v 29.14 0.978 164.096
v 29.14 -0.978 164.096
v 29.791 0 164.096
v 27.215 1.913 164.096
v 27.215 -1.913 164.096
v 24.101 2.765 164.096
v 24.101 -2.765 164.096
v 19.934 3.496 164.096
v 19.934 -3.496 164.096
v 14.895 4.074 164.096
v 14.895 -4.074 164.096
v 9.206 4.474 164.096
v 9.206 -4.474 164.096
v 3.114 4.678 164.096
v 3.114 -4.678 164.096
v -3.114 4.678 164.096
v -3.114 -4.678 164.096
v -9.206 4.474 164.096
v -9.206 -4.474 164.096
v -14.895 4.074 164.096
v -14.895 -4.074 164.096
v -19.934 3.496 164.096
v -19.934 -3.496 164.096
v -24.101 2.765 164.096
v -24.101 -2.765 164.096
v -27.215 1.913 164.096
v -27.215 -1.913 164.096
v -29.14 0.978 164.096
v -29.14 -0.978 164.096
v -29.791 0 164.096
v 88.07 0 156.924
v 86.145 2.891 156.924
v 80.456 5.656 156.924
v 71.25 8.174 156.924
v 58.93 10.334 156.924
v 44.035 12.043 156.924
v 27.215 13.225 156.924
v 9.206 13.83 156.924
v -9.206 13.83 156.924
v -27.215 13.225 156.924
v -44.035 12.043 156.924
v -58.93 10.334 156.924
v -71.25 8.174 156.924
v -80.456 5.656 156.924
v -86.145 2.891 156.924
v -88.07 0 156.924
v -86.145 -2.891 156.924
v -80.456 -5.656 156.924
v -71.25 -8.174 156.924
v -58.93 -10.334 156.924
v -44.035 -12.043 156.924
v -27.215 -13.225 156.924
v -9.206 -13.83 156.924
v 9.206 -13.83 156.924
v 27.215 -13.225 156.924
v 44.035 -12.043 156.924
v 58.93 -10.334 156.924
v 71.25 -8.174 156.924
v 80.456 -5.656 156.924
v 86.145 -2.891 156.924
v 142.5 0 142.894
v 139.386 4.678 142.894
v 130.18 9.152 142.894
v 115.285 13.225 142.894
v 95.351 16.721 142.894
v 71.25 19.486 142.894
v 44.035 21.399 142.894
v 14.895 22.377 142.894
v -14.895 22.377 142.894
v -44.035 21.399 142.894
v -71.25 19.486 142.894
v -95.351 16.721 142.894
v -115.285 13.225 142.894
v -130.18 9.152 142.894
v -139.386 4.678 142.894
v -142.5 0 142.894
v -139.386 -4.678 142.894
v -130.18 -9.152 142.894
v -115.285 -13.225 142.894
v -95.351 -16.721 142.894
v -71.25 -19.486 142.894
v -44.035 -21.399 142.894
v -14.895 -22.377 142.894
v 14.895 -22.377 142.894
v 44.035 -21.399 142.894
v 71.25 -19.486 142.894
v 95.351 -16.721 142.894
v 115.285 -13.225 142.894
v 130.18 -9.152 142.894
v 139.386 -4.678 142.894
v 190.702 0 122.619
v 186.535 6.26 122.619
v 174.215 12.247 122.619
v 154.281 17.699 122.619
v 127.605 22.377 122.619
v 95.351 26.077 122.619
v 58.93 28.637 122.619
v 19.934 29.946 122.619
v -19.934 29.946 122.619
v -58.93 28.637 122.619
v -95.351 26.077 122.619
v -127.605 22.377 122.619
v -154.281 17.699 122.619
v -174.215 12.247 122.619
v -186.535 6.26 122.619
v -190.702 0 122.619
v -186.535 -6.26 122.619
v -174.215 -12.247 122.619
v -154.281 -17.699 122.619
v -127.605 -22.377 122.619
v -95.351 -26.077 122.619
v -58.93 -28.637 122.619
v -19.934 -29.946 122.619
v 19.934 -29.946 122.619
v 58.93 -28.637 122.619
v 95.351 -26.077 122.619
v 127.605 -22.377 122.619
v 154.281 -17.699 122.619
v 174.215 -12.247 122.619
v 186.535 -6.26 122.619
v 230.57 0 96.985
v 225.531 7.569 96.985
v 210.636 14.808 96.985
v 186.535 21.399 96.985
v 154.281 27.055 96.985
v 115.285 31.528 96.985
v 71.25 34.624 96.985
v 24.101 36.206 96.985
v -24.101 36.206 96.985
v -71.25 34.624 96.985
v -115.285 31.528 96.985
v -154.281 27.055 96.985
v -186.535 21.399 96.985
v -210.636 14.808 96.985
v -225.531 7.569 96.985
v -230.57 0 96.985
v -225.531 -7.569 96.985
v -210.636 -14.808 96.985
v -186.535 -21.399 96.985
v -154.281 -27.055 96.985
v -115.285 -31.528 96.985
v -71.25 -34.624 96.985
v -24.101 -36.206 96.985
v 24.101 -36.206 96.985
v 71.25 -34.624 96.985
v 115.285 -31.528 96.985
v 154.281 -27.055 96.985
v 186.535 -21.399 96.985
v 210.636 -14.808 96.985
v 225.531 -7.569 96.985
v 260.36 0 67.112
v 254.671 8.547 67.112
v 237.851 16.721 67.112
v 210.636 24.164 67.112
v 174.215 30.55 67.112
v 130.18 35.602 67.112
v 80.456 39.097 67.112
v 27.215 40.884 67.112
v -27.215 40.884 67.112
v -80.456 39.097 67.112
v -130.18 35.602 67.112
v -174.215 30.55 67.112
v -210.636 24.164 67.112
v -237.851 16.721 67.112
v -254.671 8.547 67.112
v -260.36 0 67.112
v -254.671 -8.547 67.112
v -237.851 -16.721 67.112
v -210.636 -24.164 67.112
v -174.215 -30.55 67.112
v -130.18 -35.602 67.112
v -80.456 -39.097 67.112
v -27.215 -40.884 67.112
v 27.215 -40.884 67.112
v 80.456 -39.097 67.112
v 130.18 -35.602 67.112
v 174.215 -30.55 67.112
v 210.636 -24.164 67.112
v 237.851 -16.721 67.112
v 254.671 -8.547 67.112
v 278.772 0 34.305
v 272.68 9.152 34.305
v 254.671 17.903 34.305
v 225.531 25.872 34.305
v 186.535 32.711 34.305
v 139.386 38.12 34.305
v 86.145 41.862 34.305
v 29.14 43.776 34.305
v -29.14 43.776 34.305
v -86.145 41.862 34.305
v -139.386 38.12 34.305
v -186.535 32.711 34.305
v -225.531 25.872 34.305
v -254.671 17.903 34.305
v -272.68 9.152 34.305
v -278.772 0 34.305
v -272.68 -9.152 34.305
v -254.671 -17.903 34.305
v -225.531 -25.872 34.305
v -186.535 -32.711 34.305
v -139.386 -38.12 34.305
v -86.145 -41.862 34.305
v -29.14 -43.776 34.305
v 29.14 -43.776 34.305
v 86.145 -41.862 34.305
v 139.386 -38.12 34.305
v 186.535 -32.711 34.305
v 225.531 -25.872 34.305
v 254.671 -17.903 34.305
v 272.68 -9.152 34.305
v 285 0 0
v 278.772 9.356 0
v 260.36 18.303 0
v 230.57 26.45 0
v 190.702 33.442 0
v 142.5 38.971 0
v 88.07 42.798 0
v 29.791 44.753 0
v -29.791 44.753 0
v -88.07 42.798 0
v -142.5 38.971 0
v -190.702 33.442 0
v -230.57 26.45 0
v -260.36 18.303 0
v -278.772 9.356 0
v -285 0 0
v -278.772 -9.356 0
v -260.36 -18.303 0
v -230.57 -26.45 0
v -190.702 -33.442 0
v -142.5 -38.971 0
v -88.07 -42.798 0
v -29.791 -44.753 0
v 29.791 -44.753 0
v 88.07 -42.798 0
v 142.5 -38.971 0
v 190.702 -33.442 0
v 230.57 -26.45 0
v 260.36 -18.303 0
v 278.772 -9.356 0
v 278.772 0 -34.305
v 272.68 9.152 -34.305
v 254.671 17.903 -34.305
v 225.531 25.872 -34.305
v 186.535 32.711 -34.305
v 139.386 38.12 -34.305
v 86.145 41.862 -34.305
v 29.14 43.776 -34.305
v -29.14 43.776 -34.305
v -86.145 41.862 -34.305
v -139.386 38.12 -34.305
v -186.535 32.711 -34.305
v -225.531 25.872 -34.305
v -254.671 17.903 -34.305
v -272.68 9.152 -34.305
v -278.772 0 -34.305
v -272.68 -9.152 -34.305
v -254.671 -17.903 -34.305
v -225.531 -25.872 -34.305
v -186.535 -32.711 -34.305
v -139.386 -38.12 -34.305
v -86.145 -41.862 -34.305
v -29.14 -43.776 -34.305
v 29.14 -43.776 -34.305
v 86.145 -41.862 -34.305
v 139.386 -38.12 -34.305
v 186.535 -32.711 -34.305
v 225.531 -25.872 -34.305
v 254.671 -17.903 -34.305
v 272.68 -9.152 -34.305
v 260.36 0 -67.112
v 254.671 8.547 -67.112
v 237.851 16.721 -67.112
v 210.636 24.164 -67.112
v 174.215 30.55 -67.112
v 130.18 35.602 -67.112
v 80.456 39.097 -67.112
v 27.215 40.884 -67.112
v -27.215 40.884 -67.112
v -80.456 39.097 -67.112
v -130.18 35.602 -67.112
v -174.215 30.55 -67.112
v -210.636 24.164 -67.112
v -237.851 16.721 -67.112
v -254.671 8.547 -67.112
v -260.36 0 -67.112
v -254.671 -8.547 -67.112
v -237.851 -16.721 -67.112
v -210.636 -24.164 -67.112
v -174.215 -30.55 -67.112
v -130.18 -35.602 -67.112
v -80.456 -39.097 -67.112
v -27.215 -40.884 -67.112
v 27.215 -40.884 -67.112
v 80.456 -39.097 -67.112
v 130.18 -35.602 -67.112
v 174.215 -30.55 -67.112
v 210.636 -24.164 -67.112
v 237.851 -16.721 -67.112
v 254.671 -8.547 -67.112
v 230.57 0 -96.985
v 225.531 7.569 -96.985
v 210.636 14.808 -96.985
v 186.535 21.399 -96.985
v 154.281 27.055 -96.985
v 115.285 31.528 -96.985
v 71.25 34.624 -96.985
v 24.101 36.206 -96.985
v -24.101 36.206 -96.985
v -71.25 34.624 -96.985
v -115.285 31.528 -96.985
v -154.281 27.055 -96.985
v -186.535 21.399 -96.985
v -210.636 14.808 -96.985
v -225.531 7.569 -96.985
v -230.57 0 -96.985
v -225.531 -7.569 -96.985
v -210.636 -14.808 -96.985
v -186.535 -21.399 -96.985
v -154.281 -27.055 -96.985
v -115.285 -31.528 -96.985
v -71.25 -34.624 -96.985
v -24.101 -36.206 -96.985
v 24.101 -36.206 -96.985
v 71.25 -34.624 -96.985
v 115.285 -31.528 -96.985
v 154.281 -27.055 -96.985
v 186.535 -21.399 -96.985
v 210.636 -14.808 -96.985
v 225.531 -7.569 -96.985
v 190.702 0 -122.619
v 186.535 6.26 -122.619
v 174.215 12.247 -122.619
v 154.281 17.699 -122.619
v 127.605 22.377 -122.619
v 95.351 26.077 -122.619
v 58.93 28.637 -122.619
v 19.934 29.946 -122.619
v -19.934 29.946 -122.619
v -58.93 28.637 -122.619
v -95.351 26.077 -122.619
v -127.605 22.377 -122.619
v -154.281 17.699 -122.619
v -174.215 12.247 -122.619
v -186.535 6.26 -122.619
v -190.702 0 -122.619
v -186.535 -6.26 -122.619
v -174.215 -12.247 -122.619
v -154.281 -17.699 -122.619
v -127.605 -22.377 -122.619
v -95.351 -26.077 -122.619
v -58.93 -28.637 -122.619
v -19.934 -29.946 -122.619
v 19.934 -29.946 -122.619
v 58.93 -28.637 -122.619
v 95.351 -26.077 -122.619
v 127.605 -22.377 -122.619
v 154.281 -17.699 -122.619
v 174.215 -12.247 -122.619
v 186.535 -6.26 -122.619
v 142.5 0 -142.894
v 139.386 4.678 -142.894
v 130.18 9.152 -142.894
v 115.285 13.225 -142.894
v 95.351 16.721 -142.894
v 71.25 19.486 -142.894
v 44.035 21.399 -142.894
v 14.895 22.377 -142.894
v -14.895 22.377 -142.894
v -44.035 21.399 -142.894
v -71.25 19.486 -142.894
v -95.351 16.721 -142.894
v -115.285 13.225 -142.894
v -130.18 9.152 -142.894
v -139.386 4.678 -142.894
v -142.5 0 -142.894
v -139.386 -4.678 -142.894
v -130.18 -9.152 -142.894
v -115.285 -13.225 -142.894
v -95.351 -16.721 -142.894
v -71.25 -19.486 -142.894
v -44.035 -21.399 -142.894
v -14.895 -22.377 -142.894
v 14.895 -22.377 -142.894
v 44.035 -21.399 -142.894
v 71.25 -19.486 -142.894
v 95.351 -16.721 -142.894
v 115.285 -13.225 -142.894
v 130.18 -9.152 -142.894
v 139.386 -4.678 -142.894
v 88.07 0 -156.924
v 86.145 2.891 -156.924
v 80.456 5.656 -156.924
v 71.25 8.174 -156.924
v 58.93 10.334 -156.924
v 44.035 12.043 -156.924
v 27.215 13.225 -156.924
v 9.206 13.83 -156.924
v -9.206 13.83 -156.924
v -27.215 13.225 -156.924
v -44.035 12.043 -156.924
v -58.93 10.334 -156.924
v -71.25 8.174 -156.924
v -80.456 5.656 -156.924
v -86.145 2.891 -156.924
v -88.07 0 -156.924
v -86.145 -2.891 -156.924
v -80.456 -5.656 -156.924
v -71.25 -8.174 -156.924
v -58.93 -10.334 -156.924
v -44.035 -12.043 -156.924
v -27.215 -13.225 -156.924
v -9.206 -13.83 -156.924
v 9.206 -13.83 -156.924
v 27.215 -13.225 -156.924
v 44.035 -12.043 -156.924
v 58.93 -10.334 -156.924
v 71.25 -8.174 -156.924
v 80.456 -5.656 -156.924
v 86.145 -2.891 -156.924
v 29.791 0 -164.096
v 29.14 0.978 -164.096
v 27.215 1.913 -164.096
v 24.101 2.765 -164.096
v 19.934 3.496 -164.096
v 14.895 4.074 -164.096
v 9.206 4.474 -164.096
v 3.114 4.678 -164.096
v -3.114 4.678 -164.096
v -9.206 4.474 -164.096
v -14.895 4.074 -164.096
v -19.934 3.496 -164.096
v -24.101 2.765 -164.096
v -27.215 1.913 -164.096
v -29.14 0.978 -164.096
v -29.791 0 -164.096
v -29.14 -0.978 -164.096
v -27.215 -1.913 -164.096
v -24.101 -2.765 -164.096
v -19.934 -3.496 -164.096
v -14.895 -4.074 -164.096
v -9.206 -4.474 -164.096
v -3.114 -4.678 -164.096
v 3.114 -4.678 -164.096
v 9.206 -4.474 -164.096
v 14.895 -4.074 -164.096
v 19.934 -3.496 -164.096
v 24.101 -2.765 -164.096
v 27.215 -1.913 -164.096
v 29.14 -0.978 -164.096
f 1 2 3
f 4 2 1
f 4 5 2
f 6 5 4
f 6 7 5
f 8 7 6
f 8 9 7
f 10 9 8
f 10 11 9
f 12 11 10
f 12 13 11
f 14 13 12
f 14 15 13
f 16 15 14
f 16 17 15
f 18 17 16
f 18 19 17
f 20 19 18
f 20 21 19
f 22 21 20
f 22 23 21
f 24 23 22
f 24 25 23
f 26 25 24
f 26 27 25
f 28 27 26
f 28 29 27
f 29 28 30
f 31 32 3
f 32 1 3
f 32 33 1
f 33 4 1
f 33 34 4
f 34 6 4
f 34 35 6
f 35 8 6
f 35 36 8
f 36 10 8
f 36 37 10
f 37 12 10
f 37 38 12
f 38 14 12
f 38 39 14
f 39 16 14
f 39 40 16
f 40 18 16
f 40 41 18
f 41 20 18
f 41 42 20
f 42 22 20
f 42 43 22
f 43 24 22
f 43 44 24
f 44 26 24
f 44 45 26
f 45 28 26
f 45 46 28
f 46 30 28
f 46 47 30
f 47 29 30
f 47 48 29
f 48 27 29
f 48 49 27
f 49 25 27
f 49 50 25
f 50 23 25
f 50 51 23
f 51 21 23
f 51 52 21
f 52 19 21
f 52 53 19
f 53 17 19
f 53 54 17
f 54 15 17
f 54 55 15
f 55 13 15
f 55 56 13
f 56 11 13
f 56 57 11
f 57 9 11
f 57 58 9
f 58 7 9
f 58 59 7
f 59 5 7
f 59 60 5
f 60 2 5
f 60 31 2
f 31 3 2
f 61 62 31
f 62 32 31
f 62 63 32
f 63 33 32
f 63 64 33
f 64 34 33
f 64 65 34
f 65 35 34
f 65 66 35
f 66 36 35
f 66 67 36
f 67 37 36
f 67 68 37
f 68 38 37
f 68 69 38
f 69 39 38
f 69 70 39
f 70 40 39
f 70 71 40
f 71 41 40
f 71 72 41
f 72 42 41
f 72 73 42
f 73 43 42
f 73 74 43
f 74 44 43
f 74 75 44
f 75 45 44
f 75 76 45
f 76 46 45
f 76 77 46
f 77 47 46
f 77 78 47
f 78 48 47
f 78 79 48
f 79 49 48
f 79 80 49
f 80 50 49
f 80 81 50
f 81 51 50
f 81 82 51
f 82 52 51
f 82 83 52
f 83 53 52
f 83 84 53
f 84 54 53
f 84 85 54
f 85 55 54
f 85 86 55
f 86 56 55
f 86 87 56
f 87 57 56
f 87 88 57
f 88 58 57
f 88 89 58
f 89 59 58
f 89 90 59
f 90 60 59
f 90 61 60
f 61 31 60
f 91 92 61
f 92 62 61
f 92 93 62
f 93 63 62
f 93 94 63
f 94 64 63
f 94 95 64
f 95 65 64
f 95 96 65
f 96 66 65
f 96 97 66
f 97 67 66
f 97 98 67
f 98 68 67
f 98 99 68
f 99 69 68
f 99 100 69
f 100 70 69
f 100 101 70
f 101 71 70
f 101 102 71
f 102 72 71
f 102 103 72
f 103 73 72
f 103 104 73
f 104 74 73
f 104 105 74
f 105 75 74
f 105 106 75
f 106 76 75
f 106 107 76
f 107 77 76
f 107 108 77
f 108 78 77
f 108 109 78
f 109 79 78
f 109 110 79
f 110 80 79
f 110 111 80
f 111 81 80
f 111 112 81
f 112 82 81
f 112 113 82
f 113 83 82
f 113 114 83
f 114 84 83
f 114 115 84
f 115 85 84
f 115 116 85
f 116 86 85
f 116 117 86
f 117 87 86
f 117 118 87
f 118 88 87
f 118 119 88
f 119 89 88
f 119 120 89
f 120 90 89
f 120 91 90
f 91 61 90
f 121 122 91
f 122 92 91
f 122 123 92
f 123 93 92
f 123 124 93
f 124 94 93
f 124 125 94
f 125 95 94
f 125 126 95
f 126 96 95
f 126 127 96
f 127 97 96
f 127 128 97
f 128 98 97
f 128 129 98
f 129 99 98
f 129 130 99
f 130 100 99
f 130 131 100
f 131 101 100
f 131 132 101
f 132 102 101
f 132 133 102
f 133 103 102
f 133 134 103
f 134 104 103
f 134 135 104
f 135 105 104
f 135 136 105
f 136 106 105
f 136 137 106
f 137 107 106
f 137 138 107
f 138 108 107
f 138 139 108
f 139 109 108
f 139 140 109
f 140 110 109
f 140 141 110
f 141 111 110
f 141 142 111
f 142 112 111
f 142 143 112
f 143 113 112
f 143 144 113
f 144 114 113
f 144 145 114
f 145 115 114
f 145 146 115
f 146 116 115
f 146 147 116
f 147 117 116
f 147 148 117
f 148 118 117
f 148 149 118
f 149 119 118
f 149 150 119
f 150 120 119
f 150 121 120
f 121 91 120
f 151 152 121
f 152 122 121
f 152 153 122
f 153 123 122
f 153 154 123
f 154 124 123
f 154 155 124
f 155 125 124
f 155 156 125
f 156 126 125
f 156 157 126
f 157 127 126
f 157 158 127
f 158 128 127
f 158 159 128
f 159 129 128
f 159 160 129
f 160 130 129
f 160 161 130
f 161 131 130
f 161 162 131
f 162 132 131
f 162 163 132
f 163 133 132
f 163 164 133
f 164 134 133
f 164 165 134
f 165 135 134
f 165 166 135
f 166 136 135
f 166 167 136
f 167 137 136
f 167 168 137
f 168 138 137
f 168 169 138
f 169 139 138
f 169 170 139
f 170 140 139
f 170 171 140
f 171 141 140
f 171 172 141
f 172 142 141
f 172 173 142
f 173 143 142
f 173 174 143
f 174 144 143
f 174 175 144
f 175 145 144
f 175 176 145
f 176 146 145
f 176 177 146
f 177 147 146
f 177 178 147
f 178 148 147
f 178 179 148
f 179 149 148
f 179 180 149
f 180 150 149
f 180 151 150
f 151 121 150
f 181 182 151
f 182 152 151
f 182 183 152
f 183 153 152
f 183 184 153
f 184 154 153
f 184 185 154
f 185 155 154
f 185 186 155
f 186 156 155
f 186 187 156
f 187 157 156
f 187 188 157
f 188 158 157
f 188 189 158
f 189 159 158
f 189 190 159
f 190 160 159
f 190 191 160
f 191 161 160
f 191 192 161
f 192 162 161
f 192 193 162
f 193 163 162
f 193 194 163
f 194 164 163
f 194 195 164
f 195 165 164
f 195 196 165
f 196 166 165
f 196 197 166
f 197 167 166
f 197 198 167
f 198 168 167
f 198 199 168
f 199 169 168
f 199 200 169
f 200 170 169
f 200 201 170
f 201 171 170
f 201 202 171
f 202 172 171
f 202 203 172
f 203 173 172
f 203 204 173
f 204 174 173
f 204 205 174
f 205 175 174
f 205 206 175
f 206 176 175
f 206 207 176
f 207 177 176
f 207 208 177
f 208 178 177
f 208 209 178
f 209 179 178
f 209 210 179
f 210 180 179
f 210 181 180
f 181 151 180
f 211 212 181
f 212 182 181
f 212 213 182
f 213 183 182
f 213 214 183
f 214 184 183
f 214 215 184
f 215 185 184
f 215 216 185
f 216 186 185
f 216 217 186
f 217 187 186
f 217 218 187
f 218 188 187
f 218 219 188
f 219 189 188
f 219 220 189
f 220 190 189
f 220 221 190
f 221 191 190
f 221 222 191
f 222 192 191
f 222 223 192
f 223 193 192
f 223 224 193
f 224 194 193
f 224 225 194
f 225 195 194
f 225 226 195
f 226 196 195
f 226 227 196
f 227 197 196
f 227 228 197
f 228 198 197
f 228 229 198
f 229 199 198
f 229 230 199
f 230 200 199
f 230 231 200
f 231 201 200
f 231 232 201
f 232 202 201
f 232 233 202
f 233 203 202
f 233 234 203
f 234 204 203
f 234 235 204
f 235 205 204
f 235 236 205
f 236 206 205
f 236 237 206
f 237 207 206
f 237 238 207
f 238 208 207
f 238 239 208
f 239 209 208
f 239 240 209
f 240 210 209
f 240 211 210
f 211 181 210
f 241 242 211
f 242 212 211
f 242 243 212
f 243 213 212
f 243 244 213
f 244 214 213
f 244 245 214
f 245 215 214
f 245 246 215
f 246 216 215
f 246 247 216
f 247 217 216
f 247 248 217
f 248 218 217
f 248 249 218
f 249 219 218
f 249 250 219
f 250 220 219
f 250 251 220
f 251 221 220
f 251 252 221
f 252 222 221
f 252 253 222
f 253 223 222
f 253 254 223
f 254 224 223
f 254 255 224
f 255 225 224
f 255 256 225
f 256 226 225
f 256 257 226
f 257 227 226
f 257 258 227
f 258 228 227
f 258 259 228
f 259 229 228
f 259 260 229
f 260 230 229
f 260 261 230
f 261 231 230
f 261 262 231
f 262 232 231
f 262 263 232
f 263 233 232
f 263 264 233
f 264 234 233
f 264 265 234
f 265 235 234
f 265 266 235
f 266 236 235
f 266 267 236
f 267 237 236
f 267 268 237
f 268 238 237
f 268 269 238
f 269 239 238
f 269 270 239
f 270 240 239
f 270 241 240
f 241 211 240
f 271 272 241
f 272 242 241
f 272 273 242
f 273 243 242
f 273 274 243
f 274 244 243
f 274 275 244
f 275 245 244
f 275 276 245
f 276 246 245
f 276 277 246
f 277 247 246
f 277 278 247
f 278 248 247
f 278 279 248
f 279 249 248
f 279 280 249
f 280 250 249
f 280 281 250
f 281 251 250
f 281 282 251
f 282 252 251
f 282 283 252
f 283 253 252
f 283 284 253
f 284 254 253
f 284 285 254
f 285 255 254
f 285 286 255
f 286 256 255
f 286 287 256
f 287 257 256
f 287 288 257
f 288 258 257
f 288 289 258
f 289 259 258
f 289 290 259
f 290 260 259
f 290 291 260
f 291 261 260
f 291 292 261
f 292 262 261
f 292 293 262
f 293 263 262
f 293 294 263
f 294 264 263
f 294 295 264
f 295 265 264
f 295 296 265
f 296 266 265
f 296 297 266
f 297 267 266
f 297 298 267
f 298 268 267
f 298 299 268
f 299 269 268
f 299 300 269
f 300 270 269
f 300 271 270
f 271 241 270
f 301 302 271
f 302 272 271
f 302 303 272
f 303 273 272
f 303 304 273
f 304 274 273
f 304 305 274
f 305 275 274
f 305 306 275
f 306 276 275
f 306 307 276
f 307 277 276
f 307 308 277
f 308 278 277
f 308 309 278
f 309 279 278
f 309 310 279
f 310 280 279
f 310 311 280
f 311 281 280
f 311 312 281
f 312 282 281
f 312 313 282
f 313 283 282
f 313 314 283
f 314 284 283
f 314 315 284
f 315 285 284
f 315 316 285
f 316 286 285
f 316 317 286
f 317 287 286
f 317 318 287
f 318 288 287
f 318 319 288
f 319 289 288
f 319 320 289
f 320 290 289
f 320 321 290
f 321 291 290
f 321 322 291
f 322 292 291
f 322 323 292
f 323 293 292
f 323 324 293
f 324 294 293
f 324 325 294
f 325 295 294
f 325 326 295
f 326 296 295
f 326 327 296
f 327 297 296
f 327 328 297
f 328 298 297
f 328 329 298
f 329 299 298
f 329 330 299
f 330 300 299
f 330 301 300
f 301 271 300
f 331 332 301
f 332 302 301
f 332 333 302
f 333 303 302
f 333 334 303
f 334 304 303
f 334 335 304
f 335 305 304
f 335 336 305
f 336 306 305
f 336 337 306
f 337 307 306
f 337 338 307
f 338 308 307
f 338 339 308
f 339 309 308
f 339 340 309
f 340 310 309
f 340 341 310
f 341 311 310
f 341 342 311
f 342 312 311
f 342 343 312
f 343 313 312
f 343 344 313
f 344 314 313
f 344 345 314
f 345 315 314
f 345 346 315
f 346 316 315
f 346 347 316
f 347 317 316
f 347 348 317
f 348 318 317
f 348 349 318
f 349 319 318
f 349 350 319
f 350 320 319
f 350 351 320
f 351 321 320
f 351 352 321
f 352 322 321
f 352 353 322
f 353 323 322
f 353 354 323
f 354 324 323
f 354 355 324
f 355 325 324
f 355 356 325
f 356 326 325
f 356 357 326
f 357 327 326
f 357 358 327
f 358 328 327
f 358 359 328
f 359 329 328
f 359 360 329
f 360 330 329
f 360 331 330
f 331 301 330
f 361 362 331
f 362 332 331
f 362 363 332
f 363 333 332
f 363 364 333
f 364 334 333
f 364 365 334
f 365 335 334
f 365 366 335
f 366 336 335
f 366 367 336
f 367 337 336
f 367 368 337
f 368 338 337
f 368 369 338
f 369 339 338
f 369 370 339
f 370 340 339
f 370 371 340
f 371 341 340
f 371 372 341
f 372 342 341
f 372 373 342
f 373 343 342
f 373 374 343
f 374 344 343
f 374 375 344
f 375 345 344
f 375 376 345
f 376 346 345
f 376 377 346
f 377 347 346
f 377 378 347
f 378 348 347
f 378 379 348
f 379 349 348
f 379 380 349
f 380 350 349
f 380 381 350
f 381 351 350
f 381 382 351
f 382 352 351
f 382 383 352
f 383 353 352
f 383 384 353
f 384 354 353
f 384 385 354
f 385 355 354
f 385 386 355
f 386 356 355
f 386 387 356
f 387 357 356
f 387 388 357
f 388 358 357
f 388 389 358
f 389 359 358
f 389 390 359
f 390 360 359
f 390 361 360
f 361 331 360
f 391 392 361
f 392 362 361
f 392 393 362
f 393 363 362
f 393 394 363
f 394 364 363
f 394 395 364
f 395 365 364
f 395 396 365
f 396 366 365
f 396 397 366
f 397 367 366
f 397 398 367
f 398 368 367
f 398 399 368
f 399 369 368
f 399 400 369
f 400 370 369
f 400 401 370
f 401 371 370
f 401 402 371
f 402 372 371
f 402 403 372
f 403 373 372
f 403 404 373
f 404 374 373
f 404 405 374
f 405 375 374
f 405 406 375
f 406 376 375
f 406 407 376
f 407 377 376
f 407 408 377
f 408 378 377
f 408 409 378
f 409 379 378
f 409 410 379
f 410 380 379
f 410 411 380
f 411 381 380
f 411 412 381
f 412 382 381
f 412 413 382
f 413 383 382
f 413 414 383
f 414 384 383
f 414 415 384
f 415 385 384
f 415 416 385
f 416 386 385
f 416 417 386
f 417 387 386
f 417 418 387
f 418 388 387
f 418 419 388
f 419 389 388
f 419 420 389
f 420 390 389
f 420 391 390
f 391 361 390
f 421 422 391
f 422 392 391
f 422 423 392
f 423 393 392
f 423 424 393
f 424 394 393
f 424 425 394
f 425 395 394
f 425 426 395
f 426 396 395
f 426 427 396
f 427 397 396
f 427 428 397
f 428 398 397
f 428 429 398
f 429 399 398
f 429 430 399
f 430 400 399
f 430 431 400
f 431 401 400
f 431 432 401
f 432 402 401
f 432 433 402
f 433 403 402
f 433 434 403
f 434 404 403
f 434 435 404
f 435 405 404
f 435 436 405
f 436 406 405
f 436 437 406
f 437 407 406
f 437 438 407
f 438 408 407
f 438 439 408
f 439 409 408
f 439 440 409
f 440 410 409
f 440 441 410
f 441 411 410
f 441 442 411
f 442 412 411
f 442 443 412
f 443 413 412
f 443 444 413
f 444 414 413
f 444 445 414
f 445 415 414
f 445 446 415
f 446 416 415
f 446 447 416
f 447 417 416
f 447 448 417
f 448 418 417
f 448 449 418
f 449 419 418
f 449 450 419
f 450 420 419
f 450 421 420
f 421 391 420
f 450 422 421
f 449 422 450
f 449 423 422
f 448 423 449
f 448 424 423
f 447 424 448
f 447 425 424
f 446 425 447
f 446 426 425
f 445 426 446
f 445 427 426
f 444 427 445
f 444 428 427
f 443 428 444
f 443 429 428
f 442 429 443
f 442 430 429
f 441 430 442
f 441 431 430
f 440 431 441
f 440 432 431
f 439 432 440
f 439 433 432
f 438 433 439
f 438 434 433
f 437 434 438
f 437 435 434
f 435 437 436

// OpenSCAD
// Generated by SolidPython 1.0.1 on 2020-07-29 00:46:53


scale(v = [19, 3, 11]) {
	sphere(r = 15);
}
/***********************************************
*********      SolidPython code:      **********
************************************************
 
# import packages: SolidPython
from solid import *
from solid.utils import *
from itertools import chain, combinations, permutations


class Resize:

    def __init__(self, scad_file):
        self.scad_file = scad_file
        #self.scad_file = import_scad(scad_file)
        # cone/cylinder param:
        self.r1 = 0
        self.r2 = 0
        self.h = 0
        # rectangular prism param:
        self.w = 0
        self.l = 0
        # ellipse param:
        self.r = 0

    # import OpenScad code (file name corresponds to shape)


    # classify shape + parameters
    def assign(self, param1, param2, param3):
        if self.scad_file == 'cone.scad':
            self.r1 = param1
            self.r2 = param2
            self.h = param3
        elif self.scad_file == 'cylinder.scad':
            self.r1 = param1
            self.r2 = param2
            self.h = param3
        elif self.scad_file == 'rectangularPrism.scad':
            self.h = param1
            self.l = param2
            self.w = param3
        else:
            self.r = param1
            self.h = param2

    # resize parameters
    def iterate(self):
        x = range(3, 20, 2)
        i = 1
        if self.scad_file == 'cone.scad':
            tempList = list(permutations(x, 2))
            for temp in tempList:
                param1 = temp[0]
                param2 = temp[1]
                filepath = 'produced_scad_files/' + 'cone' + str(param1) + '_' + str(param2) + '_' + '.scad'
                scad_render_to_file(cylinder(h=param1, r1=param2, r2=0), filepath)

        elif self.scad_file == 'cylinder.scad':
            tempList = list(permutations(x, 3))
            for temp in tempList:
                param1 = temp[0]
                param2 = temp[1]
                filepath = 'produced_scad_files/' + 'cylinder' + str(param1) + '_' + str(param2) + '_' + '.scad'
                scad_render_to_file(cylinder(h=param1, r1=param2, r2=param2), filepath)

        elif self.scad_file == 'rectangularPrism.scad':
            tempList = list(permutations(x, 3))
            for temp in tempList:
                param1 = temp[0]
                param2 = temp[1]
                param3 = temp[2]
                filepath = 'produced_scad_files/' + 'rectangularPrism' + str(param1) + '_' + str(param2) + '_' + str(
                    param3) + '.scad'
                scad_render_to_file(cube(size=(param1, param2, param3)), filepath)

        elif self.scad_file == 'ellipse.scad':
            tempList = list(permutations(x, 4))
            for temp in tempList:
                param1 = temp[0]
                param2 = temp[1]
                param3 = temp[2]
                param4 = temp[3]
                filepath = 'produced_scad_files/' + 'ellipse' + str(param1) + '_' + str(param2) + '_' + str(param3) + '_' + str(param4) + '.scad'
                scad_render_to_file(scale([param1, param2, param3])(sphere(r=param4)), filepath)

    def render_to_scadfile(self):
        scad_render_to_file(scad, 'example.scad') 
 
************************************************/
